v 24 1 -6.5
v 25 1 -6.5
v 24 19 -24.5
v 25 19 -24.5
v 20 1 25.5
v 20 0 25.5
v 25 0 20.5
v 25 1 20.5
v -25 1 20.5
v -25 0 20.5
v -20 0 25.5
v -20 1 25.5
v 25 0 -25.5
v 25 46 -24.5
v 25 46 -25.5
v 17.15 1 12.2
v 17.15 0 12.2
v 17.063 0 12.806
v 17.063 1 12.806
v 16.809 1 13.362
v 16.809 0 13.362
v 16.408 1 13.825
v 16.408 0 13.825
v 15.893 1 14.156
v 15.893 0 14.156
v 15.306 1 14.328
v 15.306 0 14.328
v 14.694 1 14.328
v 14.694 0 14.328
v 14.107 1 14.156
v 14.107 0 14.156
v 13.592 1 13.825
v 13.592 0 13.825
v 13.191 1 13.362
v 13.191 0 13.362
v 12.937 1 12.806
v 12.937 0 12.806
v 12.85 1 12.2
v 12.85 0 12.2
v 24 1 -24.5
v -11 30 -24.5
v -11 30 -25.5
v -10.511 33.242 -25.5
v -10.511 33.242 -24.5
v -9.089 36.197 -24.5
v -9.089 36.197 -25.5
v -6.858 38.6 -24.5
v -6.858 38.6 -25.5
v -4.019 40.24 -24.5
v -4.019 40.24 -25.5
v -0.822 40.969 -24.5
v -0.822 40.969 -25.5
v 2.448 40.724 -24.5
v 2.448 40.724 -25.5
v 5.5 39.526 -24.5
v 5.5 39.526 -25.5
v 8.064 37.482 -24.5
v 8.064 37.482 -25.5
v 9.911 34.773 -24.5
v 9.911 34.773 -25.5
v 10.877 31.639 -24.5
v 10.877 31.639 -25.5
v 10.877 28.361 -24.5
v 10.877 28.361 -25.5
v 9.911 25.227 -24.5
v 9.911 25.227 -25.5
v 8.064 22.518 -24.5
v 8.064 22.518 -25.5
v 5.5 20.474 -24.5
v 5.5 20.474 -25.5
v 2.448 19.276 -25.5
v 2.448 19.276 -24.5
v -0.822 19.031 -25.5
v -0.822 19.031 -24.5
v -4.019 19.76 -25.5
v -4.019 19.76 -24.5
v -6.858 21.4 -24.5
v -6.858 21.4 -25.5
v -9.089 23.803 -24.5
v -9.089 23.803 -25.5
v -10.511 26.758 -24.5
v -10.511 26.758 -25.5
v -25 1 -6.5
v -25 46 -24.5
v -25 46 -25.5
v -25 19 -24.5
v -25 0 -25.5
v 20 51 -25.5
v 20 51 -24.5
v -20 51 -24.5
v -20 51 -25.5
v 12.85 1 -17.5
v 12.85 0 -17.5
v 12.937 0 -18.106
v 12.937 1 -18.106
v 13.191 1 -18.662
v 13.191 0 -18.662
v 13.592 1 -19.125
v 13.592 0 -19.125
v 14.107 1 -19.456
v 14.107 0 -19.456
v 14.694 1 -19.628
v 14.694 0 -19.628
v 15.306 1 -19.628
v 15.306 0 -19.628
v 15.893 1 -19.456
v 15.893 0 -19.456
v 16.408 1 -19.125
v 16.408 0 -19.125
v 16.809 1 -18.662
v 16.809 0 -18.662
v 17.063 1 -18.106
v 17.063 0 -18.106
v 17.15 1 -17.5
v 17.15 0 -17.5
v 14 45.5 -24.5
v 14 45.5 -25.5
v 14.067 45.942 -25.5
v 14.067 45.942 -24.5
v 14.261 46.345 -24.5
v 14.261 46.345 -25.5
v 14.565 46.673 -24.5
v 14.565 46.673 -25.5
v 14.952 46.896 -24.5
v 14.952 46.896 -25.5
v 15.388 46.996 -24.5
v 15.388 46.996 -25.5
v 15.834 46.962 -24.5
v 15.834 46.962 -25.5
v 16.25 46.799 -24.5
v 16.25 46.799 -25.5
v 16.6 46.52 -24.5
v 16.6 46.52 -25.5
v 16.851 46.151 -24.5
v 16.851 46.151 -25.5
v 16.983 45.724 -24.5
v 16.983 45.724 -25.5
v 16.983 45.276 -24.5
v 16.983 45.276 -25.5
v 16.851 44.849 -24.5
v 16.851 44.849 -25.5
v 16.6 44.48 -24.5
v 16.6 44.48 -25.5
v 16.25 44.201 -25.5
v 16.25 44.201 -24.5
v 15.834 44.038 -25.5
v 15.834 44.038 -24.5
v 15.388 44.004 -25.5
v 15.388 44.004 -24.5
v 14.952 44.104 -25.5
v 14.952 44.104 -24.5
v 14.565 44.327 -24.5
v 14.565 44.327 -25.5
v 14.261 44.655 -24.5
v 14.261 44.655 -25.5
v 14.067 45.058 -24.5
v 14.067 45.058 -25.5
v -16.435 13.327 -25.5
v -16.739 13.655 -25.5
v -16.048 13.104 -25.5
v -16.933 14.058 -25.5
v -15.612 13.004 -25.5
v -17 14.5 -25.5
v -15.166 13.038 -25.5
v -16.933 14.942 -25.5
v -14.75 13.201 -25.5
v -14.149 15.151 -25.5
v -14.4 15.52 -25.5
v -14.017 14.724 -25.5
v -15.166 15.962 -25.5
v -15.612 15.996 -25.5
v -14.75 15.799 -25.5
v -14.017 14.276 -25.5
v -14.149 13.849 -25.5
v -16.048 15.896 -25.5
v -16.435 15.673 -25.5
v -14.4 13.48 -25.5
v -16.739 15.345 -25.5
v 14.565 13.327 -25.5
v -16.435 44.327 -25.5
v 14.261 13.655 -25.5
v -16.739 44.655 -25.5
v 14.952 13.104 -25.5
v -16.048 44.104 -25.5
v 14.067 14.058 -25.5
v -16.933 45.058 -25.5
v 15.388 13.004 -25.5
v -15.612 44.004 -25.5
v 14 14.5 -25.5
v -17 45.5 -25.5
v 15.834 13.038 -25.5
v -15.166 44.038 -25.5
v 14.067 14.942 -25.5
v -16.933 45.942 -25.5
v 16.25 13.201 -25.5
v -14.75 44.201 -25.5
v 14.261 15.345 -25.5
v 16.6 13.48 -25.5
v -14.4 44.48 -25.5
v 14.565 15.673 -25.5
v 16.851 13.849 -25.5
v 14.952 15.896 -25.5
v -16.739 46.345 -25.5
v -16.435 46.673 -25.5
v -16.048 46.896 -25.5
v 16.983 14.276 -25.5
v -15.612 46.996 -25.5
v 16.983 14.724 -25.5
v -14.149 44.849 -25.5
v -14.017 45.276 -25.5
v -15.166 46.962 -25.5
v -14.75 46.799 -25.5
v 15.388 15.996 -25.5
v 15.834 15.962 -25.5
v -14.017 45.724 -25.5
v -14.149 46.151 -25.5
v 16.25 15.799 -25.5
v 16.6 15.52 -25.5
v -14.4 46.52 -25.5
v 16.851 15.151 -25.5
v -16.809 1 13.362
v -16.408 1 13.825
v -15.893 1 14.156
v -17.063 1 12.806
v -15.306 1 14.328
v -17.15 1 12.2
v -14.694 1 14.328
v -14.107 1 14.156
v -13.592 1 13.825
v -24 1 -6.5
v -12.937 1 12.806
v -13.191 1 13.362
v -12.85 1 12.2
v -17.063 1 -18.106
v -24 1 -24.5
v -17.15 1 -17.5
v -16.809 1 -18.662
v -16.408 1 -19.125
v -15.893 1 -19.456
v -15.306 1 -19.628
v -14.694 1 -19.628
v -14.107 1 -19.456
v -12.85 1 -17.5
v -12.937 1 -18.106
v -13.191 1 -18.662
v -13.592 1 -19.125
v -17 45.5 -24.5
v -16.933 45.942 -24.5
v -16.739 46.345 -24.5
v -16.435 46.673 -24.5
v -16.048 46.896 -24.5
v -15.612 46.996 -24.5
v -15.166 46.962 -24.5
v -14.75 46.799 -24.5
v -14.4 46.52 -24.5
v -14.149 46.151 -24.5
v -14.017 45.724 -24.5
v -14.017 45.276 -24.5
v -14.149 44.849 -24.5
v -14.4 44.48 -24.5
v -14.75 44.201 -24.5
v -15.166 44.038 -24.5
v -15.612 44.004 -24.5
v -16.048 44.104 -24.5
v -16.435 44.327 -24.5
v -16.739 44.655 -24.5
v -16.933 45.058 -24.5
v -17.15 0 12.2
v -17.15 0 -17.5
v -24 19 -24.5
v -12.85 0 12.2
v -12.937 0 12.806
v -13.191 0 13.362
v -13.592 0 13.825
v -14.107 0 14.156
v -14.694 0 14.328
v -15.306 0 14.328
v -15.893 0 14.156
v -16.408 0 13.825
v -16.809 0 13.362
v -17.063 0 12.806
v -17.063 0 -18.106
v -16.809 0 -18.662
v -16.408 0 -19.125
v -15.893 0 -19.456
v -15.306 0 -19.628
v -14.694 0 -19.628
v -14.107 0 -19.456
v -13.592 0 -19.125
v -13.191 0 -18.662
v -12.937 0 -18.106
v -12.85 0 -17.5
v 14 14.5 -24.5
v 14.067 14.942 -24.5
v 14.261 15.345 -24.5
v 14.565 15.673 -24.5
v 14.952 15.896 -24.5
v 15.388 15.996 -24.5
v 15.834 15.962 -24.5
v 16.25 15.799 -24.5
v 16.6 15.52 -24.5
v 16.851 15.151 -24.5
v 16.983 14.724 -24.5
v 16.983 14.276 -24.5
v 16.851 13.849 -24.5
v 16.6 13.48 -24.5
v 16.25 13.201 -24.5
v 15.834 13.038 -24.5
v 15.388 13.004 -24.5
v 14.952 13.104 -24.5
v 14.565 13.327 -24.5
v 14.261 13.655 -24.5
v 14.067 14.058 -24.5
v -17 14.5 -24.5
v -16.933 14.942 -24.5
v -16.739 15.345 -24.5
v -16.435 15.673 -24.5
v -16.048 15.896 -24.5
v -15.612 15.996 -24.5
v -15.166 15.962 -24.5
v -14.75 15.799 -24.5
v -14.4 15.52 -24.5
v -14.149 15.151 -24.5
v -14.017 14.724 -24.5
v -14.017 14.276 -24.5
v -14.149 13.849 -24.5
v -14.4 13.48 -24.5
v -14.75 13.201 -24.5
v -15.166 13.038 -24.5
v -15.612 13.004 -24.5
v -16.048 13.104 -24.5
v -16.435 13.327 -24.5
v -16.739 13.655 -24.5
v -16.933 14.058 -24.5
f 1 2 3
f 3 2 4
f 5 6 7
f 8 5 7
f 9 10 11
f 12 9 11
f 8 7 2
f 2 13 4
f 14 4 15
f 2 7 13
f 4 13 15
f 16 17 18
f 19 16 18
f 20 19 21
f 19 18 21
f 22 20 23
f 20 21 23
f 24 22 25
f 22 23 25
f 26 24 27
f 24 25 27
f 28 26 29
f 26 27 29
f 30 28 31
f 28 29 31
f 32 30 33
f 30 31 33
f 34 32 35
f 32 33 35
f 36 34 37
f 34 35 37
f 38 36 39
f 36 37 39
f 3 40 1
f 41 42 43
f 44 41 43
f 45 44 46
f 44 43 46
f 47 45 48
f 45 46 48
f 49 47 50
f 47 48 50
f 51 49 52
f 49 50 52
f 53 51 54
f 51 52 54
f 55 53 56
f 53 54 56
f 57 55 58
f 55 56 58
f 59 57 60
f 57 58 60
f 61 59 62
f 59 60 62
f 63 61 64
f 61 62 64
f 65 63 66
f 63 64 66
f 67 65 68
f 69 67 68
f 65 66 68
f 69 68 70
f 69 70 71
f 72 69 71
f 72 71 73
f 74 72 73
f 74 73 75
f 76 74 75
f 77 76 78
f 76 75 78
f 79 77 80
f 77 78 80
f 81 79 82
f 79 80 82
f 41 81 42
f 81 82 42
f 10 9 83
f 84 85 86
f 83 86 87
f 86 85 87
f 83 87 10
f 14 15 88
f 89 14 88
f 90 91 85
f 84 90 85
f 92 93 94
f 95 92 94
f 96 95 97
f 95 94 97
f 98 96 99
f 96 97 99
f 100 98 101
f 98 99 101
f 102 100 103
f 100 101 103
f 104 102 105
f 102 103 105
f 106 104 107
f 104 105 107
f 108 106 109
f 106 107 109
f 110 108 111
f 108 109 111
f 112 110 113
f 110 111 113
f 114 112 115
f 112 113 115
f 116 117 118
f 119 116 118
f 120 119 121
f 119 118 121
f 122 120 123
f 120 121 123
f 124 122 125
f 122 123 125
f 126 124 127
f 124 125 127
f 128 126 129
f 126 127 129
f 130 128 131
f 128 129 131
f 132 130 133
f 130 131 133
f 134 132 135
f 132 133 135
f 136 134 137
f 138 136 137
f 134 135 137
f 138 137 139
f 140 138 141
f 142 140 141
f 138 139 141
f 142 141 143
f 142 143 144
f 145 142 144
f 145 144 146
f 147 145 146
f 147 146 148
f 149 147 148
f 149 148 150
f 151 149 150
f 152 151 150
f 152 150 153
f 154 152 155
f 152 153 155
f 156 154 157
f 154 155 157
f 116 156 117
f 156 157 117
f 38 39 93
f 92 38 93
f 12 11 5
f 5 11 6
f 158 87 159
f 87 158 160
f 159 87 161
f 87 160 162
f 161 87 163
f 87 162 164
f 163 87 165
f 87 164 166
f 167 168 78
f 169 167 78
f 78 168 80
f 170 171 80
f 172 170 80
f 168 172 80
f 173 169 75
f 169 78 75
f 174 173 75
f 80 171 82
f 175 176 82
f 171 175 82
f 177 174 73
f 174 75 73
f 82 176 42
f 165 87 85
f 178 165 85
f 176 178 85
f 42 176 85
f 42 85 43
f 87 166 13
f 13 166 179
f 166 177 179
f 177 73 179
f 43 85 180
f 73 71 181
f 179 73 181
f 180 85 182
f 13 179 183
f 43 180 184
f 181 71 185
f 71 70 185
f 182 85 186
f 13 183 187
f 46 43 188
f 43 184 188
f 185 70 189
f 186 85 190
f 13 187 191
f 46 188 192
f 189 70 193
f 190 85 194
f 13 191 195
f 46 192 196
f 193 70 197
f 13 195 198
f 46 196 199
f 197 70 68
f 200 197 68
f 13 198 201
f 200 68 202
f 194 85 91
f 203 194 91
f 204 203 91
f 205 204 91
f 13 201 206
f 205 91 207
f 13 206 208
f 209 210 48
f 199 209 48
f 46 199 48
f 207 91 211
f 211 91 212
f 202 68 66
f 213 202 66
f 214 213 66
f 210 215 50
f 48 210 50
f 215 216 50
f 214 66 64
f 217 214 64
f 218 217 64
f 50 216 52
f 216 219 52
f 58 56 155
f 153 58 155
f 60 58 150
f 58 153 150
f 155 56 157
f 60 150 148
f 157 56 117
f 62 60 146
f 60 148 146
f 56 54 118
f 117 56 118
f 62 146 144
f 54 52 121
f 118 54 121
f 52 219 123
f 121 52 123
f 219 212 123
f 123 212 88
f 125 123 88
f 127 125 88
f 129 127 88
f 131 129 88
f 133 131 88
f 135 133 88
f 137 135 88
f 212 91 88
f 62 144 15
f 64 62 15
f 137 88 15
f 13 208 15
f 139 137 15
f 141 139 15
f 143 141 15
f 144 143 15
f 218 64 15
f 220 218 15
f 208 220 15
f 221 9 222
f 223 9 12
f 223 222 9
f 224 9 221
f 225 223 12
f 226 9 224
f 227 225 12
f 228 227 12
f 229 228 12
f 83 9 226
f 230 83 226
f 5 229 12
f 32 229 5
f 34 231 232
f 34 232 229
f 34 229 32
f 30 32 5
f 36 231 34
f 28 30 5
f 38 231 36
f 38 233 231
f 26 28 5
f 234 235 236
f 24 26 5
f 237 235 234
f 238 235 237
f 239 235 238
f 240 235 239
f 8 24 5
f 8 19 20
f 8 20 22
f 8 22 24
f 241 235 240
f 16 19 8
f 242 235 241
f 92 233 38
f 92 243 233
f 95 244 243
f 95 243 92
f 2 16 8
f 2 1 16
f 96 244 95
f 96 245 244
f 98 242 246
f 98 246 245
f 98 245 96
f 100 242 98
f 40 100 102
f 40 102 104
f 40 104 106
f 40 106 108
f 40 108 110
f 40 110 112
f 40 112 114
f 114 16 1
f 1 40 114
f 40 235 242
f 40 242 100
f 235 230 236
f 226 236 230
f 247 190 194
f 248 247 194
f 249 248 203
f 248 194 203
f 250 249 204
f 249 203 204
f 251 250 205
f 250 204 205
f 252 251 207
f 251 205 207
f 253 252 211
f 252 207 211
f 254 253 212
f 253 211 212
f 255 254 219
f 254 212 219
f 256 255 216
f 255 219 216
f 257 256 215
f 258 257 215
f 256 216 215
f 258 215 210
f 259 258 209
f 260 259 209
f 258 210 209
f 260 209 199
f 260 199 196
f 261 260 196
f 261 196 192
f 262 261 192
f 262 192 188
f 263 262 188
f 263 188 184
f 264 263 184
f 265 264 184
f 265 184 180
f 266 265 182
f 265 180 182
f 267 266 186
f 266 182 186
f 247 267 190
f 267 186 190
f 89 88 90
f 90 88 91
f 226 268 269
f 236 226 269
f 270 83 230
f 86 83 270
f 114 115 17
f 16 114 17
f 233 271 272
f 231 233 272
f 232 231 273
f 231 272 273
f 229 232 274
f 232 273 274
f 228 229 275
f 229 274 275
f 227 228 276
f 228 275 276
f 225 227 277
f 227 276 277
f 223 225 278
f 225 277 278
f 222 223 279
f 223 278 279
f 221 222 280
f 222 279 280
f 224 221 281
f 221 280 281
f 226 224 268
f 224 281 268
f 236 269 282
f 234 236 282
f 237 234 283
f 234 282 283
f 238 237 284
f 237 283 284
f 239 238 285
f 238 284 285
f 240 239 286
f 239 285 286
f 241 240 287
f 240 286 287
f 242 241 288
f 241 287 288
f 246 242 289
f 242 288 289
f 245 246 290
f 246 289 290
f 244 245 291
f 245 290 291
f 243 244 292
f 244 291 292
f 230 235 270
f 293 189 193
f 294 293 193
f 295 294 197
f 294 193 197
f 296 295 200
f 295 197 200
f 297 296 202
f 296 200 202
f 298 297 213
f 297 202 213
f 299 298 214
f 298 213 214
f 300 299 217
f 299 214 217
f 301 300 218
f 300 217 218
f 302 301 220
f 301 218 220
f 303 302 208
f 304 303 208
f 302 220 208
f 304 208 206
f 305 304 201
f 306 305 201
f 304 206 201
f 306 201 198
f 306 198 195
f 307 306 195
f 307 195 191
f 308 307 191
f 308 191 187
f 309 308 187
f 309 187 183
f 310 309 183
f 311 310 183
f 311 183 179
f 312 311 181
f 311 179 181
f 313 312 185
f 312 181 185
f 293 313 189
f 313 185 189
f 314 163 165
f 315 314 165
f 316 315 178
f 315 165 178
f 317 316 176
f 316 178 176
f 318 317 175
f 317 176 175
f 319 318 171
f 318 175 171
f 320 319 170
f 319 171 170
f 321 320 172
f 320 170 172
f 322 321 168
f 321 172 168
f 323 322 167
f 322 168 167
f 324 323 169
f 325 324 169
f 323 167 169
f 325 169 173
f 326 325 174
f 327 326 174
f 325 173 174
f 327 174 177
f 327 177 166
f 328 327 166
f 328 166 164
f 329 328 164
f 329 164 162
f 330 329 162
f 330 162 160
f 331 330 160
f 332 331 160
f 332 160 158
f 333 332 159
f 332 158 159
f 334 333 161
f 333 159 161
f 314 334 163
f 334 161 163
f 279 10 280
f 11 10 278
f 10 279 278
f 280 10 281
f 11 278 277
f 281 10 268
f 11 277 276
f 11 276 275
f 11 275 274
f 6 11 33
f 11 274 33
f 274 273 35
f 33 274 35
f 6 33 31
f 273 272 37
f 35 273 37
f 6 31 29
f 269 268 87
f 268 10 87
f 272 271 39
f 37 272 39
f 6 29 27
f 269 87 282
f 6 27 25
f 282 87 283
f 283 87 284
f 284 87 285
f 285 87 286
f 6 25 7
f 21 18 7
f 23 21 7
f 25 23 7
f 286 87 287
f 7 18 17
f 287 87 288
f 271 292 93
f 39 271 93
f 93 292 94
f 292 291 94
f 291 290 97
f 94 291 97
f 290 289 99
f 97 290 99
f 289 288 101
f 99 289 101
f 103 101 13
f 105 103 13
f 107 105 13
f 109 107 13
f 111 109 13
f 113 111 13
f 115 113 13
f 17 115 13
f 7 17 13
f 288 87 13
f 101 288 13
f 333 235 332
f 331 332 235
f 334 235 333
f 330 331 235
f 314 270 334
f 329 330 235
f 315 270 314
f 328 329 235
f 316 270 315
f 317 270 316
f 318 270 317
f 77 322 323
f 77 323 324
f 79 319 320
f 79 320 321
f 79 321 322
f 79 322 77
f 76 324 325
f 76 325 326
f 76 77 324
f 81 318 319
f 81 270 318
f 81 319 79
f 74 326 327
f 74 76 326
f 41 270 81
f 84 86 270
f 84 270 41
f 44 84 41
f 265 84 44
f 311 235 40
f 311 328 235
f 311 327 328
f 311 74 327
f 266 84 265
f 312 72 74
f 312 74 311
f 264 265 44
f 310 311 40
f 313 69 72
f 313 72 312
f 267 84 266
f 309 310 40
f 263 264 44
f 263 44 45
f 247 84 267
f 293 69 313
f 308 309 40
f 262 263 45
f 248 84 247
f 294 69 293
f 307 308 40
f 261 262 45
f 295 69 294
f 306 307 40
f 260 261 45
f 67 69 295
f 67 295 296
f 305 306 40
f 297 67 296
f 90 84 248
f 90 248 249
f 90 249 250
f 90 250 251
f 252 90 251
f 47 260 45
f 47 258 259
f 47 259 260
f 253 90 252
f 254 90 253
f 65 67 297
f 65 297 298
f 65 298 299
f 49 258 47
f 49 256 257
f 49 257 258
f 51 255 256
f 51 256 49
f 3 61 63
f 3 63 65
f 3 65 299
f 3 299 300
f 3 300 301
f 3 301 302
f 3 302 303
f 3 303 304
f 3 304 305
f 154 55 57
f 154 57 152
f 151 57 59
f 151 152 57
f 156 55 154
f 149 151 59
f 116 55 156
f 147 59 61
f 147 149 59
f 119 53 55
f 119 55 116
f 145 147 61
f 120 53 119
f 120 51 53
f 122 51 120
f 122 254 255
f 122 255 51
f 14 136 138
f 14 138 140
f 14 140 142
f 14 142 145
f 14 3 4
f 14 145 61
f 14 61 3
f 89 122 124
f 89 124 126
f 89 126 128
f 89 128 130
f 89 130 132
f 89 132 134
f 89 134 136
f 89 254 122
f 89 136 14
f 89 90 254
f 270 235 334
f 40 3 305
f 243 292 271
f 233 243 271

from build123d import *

# Parameters (mm, degrees)
EXTRUDE_2_DEPTH = 1
SKETCH_4_R      = 11
SKETCH_4_R_2    = 1.5
EXTRUDE_3_DEPTH = 1
EXTRUDE_4_DEPTH = 1
EXTRUDE_5_DEPTH = 1


with BuildPart() as part:
    # 草图3 → 凸台-拉伸2 (new body)
    with BuildSketch(Plane(origin=(0, 0, 0), x_dir=(1, 0, 0), z_dir=(0, 1, 0))):
        Polygon((-25, -20.5), (-20, -25.5), (20, -25.5), (25, -20.5), (25, 25.5), (-25, 25.5), align=None)
        with BuildLine():
            Line((-12.85, 17.5), (-12.85, -12.2))
            ThreePointArc((-12.85, -12.2), (-15, -14.35), (-17.15, -12.2))
            Line((-17.15, -12.2), (-17.15, 17.5))
            ThreePointArc((-17.15, 17.5), (-15, 19.65), (-12.85, 17.5))
        make_face(mode=Mode.SUBTRACT)
        with BuildLine():
            Line((17.15, 17.5), (17.15, -12.2))
            ThreePointArc((17.15, -12.2), (15, -14.35), (12.85, -12.2))
            Line((12.85, -12.2), (12.85, 17.5))
            ThreePointArc((12.85, 17.5), (15, 19.65), (17.15, 17.5))
        make_face(mode=Mode.SUBTRACT)
    extrude(amount=EXTRUDE_2_DEPTH)

    # 草图4 → 凸台-拉伸3 (add)
    with BuildSketch(Plane(origin=(0, 0, -25.5), x_dir=(-1, 0, 0), z_dir=(0, 0, -1))):
        Polygon((-20, 51), (20, 51), (25, 46), (25, 0), (-25, 0), (-25, 46), align=None)
        with Locations((0, 30)):
            Circle(SKETCH_4_R, mode=Mode.SUBTRACT)
        with Locations((-15.5, 45.5)):
            Circle(SKETCH_4_R_2, mode=Mode.SUBTRACT)
        with Locations((15.5, 45.5)):
            Circle(SKETCH_4_R_2, mode=Mode.SUBTRACT)
        with Locations((15.5, 14.5)):
            Circle(SKETCH_4_R_2, mode=Mode.SUBTRACT)
        with Locations((-15.5, 14.5)):
            Circle(SKETCH_4_R_2, mode=Mode.SUBTRACT)
    extrude(amount=-EXTRUDE_3_DEPTH)

    # 草图5 → 凸台-拉伸4 (add)
    with BuildSketch(Plane.ZY.offset(25)):
        Polygon((-25.5, 20), (-25.5, 0), (-5.5, 0), align=None)
    extrude(amount=-EXTRUDE_4_DEPTH)

    # 草图6 → 凸台-拉伸5 (add)
    with BuildSketch(Plane(origin=(25, 0, 0), x_dir=(0, 0, -1), z_dir=(1, 0, 0))):
        Polygon((25.5, 20), (25.5, 0), (5.5, 0), align=None)
    extrude(amount=-EXTRUDE_5_DEPTH)


solid = part.part
